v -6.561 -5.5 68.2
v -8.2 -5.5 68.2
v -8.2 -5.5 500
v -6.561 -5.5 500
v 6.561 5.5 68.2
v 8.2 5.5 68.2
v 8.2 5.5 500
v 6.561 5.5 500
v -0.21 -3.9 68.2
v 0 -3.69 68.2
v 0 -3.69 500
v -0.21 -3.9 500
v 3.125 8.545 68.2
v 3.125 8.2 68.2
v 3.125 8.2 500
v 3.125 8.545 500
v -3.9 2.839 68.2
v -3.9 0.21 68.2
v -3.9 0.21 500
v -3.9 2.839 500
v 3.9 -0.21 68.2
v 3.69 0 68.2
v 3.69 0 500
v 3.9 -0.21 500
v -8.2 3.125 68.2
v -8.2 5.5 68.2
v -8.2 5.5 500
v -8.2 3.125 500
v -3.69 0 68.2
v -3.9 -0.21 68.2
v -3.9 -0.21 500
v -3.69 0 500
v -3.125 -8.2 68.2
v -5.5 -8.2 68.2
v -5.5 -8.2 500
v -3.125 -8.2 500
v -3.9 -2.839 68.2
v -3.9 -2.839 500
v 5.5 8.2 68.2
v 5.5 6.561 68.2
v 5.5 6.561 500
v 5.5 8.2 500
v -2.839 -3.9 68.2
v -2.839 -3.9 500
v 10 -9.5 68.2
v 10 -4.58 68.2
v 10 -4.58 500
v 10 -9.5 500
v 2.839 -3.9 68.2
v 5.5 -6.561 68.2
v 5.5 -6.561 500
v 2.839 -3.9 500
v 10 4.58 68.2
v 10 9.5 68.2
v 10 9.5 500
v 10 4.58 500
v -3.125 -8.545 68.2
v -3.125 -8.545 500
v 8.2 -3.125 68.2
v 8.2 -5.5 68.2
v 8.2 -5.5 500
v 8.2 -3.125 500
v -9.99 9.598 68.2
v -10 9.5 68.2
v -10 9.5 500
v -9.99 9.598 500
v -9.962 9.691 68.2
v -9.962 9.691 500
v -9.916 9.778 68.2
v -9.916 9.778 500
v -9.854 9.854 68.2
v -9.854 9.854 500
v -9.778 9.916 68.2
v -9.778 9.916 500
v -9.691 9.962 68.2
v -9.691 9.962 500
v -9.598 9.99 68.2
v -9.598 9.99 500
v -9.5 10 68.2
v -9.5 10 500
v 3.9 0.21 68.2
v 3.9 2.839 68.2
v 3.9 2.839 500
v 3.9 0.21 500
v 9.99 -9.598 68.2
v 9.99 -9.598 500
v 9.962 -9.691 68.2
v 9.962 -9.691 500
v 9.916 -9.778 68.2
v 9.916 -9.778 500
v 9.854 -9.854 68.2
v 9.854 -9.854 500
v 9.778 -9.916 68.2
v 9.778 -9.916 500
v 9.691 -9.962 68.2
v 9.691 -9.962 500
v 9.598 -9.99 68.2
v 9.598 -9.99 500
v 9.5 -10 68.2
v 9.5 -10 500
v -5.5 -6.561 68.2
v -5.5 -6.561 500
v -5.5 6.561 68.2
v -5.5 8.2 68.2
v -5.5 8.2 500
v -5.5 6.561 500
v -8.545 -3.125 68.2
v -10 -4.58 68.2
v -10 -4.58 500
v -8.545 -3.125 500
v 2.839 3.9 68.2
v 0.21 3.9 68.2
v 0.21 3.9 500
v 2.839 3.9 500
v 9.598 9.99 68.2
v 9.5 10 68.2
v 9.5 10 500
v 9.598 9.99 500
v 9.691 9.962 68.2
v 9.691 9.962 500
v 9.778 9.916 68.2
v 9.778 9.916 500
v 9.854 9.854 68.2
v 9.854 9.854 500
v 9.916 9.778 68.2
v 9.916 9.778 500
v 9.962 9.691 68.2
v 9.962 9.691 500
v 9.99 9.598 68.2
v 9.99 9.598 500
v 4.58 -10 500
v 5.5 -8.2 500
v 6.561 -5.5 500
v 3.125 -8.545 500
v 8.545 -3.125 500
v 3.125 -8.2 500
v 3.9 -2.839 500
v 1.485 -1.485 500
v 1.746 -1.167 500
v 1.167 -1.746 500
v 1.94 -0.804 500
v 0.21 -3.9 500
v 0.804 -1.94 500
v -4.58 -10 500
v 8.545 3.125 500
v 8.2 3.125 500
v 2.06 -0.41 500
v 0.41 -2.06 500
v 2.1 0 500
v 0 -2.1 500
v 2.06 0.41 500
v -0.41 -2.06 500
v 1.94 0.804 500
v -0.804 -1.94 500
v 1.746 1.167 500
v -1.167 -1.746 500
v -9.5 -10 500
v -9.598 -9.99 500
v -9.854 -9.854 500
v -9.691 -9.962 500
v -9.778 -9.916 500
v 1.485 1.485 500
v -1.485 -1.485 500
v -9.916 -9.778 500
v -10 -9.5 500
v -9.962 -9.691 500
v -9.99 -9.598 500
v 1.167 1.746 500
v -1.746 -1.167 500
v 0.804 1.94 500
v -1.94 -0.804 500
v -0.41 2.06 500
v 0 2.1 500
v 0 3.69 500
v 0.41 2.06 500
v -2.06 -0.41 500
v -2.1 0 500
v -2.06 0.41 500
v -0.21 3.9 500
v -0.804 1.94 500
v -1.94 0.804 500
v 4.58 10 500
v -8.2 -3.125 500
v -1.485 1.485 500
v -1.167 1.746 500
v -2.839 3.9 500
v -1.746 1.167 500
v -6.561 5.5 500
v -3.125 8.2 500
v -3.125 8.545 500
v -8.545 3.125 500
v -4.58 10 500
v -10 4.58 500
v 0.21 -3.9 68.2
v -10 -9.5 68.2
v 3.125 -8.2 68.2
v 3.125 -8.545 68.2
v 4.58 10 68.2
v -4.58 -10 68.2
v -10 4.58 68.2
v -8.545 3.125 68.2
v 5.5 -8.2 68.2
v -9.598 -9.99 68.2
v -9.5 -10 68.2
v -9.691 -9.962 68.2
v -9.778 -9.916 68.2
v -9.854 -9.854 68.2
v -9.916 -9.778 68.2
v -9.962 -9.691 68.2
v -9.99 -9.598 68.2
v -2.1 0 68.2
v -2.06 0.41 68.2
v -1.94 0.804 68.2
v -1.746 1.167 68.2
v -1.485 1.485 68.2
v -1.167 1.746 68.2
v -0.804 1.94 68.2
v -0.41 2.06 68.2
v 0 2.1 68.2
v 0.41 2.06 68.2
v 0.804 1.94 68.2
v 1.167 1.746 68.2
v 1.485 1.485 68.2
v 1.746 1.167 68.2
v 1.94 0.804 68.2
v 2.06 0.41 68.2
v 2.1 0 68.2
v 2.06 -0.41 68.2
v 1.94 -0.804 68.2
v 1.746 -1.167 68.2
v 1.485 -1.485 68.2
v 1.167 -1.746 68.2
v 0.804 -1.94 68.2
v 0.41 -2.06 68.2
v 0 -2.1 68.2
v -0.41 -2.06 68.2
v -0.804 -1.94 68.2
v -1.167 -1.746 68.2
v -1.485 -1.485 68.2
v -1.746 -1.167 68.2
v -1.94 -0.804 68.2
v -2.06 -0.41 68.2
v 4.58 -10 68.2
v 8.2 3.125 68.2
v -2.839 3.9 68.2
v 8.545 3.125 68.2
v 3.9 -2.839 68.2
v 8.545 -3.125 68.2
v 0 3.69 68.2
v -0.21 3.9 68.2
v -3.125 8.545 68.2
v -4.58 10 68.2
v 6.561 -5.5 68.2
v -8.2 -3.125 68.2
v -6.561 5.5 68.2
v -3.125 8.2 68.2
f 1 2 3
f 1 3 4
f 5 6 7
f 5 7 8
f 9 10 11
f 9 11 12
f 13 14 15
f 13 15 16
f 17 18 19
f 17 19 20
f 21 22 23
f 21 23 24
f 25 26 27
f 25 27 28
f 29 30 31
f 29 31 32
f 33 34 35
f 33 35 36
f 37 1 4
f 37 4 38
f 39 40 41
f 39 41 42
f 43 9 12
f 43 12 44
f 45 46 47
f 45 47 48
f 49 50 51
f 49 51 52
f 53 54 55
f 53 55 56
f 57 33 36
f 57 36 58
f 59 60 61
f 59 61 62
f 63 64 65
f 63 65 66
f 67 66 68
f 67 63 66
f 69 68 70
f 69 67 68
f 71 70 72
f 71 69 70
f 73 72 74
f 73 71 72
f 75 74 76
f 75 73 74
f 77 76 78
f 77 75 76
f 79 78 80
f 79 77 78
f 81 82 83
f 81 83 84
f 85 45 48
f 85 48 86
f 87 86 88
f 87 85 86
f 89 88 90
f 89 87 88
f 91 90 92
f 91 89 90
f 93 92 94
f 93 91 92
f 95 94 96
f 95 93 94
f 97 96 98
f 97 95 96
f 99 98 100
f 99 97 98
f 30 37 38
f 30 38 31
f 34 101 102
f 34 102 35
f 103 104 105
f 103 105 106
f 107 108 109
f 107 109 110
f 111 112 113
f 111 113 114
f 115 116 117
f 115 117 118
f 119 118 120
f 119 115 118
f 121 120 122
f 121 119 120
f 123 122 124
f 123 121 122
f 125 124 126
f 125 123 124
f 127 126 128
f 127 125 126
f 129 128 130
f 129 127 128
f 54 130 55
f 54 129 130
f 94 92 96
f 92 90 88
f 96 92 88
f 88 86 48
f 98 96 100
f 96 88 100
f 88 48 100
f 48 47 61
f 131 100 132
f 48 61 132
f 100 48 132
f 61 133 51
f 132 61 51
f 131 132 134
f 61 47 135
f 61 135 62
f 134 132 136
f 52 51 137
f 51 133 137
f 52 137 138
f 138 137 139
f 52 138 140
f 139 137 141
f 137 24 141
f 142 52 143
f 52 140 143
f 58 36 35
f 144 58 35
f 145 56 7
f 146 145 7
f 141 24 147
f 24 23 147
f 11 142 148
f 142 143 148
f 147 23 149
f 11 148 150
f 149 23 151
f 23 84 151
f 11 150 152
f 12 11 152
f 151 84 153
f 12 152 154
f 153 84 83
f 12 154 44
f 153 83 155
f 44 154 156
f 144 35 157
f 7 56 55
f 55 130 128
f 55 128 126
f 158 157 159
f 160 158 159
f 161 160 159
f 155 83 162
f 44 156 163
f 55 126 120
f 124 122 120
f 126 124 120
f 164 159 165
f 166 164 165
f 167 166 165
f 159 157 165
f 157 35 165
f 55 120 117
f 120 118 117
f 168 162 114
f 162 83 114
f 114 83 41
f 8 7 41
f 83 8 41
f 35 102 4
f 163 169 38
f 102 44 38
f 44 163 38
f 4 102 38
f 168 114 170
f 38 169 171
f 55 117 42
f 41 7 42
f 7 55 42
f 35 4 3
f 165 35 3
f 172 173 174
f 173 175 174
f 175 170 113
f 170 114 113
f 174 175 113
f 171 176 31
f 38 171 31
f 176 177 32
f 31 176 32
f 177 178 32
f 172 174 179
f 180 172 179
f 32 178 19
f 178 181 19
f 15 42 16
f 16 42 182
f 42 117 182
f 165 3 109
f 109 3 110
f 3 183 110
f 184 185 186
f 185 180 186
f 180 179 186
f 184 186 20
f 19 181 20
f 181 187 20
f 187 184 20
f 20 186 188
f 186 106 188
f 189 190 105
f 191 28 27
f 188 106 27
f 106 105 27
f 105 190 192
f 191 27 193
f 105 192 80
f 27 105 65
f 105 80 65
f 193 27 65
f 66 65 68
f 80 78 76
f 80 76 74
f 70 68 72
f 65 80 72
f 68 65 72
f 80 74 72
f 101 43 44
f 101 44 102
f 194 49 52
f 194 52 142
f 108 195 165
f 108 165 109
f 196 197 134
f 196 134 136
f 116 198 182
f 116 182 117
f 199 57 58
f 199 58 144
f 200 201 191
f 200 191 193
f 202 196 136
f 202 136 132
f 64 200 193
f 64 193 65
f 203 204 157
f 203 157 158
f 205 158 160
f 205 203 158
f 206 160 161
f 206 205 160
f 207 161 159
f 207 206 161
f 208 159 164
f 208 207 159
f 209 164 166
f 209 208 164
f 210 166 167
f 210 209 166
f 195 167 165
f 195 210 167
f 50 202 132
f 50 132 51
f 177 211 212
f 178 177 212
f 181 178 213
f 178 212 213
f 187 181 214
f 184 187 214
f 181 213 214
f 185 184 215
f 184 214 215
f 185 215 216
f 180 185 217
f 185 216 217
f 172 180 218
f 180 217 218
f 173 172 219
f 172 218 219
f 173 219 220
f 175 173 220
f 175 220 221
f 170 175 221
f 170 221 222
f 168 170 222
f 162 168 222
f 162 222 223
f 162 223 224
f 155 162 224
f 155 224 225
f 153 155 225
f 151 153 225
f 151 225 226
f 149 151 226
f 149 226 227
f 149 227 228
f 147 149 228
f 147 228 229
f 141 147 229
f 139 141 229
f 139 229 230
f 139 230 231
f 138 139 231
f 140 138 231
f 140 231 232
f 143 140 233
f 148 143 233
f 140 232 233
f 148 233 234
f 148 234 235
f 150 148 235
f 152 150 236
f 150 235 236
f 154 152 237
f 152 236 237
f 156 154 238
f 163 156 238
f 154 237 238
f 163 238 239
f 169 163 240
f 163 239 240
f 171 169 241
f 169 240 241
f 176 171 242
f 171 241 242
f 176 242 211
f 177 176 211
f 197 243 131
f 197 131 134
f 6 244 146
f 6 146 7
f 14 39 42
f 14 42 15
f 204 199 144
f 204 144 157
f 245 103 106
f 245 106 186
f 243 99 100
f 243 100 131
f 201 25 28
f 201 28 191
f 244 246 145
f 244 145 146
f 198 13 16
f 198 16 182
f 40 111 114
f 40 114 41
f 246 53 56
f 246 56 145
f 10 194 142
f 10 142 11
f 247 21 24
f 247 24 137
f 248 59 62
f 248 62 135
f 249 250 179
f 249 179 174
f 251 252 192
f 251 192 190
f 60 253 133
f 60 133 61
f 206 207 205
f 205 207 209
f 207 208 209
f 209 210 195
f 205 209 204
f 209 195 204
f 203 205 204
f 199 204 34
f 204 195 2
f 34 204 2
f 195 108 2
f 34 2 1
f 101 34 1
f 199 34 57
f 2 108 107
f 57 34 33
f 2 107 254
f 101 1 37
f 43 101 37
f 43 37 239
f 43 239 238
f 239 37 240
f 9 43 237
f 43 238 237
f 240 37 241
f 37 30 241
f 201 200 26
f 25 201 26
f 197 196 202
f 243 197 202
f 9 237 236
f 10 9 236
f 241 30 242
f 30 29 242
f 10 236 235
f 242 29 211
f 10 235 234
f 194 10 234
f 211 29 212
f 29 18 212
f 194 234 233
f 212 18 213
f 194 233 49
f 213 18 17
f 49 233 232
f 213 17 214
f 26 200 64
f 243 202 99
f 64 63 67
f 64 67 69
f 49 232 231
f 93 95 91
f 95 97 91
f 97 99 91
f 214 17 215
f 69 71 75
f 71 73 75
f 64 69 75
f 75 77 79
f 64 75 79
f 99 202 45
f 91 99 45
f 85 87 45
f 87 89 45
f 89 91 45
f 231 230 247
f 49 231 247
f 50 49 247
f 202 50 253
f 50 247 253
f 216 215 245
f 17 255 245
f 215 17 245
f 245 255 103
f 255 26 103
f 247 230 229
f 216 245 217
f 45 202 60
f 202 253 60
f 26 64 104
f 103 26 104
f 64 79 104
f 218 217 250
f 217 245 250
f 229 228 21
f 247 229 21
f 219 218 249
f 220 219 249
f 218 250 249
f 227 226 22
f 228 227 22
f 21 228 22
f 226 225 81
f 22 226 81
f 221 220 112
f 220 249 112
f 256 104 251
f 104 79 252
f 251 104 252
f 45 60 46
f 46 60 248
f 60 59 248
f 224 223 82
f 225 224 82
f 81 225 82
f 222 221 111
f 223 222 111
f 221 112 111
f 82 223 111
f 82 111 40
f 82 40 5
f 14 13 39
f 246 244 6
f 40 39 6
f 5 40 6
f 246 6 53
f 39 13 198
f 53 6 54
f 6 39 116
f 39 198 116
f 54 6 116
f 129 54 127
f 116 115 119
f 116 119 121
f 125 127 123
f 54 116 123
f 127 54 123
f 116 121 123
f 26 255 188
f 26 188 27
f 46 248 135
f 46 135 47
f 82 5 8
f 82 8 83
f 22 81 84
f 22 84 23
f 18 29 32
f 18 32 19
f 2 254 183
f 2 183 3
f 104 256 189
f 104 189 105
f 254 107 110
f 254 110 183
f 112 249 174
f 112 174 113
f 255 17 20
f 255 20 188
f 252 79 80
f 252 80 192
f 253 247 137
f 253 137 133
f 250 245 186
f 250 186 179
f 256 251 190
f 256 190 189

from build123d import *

# Parameters (mm, degrees)
SKETCH1_R                 = 2.1
BOSS_EXTRUDE1_DEPTH       = 500
M5X0_8_TAPPED_HOLE1_D     = 4.2
M5X0_8_TAPPED_HOLE1_DEPTH = 13.97
M5X0_8_TAPPED_HOLE1_TIP   = 1.2618073
M5X0_8_TAPPED_HOLE2_D     = 4.2
M5X0_8_TAPPED_HOLE2_DEPTH = 13.97
M5X0_8_TAPPED_HOLE2_TIP   = 1.2618073


with BuildPart() as part:
    # Sketch1 → Boss-Extrude1 (new body)
    with BuildSketch(Plane(origin=(0, 0, 0), x_dir=(-1, 0, 0), z_dir=(0, 0, -1))):
        with BuildLine():
            Line((-3.9, -0.21), (-3.9, -2.839339828))
            Line((-3.9, -2.839339828), (-6.560660172, -5.5))
            Line((-6.560660172, -5.5), (-8.2, -5.5))
            Line((-8.2, -5.5), (-8.2, -3.125))
            Line((-8.2, -3.125), (-8.545, -3.125))
            Line((-8.545, -3.125), (-10, -4.58))
            Line((-10, -4.58), (-10, -9.5))
            ThreePointArc((-10, -9.5), (-9.853553391, -9.853553391), (-9.5, -10))
            Line((-9.5, -10), (-4.58, -10))
            Line((-4.58, -10), (-3.125, -8.545))
            Line((-3.125, -8.545), (-3.125, -8.2))
            Line((-3.125, -8.2), (-5.5, -8.2))
            Line((-5.5, -8.2), (-5.5, -6.560660172))
            Line((-5.5, -6.560660172), (-2.839339828, -3.9))
            Line((-2.839339828, -3.9), (-0.21, -3.9))
            Line((-0.21, -3.9), (0, -3.69))
            Line((0, -3.69), (0.21, -3.9))
            Line((0.21, -3.9), (2.839339828, -3.9))
            Line((2.839339828, -3.9), (5.5, -6.560660172))
            Line((5.5, -6.560660172), (5.5, -8.2))
            Line((5.5, -8.2), (3.125, -8.2))
            Line((3.125, -8.2), (3.125, -8.545))
            Line((3.125, -8.545), (4.58, -10))
            Line((4.58, -10), (9.5, -10))
            ThreePointArc((9.5, -10), (9.853553391, -9.853553391), (10, -9.5))
            Line((10, -9.5), (10, -4.58))
            Line((10, -4.58), (8.545, -3.125))
            Line((8.545, -3.125), (8.2, -3.125))
            Line((8.2, -3.125), (8.2, -5.5))
            Line((8.2, -5.5), (6.560660172, -5.5))
            Line((6.560660172, -5.5), (3.9, -2.839339828))
            Line((3.9, -2.839339828), (3.9, -0.21))
            Line((3.9, -0.21), (3.69, 0))
            Line((3.69, 0), (3.9, 0.21))
            Line((3.9, 0.21), (3.9, 2.839339828))
            Line((3.9, 2.839339828), (6.560660172, 5.5))
            Line((6.560660172, 5.5), (8.2, 5.5))
            Line((8.2, 5.5), (8.2, 3.125))
            Line((8.2, 3.125), (8.545, 3.125))
            Line((8.545, 3.125), (10, 4.58))
            Line((10, 4.58), (10, 9.5))
            ThreePointArc((10, 9.5), (9.853553391, 9.853553391), (9.5, 10))
            Line((9.5, 10), (4.58, 10))
            Line((4.58, 10), (3.125, 8.545))
            Line((3.125, 8.545), (3.125, 8.2))
            Line((3.125, 8.2), (5.5, 8.2))
            Line((5.5, 8.2), (5.5, 6.560660172))
            Line((5.5, 6.560660172), (2.839339828, 3.9))
            Line((2.839339828, 3.9), (0.21, 3.9))
            Line((0.21, 3.9), (0, 3.69))
            Line((0, 3.69), (-0.21, 3.9))
            Line((-0.21, 3.9), (-2.839339828, 3.9))
            Line((-2.839339828, 3.9), (-5.5, 6.560660172))
            Line((-5.5, 6.560660172), (-5.5, 8.2))
            Line((-5.5, 8.2), (-3.125, 8.2))
            Line((-3.125, 8.2), (-3.125, 8.545))
            Line((-3.125, 8.545), (-4.58, 10))
            Line((-4.58, 10), (-9.5, 10))
            ThreePointArc((-9.5, 10), (-9.853553391, 9.853553391), (-10, 9.5))
            Line((-10, 9.5), (-10, 4.58))
            Line((-10, 4.58), (-8.545, 3.125))
            Line((-8.545, 3.125), (-8.2, 3.125))
            Line((-8.2, 3.125), (-8.2, 5.5))
            Line((-8.2, 5.5), (-6.560660172, 5.5))
            Line((-6.560660172, 5.5), (-3.9, 2.839339828))
            Line((-3.9, 2.839339828), (-3.9, 0.21))
            Line((-3.9, 0.21), (-3.69, 0))
            Line((-3.69, 0), (-3.9, -0.21))
        make_face()
        Circle(SKETCH1_R, mode=Mode.SUBTRACT)
    extrude(amount=-BOSS_EXTRUDE1_DEPTH)

    # Split1
    split(bisect_by=Plane.XY.offset(68.2), keep=Keep.TOP)

    # M5x0.8 Tapped Hole1
    with Locations(Plane.XY.offset(500)):
        with Locations((0, 0)):
            Hole(M5X0_8_TAPPED_HOLE1_D / 2, depth=M5X0_8_TAPPED_HOLE1_DEPTH)
            with Locations((0, 0, -(M5X0_8_TAPPED_HOLE1_DEPTH + M5X0_8_TAPPED_HOLE1_TIP / 2))):  # 118° drill point
                Cone(0, M5X0_8_TAPPED_HOLE1_D / 2, M5X0_8_TAPPED_HOLE1_TIP, mode=Mode.SUBTRACT)

    # M5x0.8 Tapped Hole2
    with Locations(Plane(origin=(0, 0, 68.2), x_dir=(-1, 0, 0), z_dir=(0, 0, -1))):
        with Locations((0, 0)):
            Hole(M5X0_8_TAPPED_HOLE2_D / 2, depth=M5X0_8_TAPPED_HOLE2_DEPTH)
            with Locations((0, 0, -(M5X0_8_TAPPED_HOLE2_DEPTH + M5X0_8_TAPPED_HOLE2_TIP / 2))):  # 118° drill point
                Cone(0, M5X0_8_TAPPED_HOLE2_D / 2, M5X0_8_TAPPED_HOLE2_TIP, mode=Mode.SUBTRACT)


solid = part.part
